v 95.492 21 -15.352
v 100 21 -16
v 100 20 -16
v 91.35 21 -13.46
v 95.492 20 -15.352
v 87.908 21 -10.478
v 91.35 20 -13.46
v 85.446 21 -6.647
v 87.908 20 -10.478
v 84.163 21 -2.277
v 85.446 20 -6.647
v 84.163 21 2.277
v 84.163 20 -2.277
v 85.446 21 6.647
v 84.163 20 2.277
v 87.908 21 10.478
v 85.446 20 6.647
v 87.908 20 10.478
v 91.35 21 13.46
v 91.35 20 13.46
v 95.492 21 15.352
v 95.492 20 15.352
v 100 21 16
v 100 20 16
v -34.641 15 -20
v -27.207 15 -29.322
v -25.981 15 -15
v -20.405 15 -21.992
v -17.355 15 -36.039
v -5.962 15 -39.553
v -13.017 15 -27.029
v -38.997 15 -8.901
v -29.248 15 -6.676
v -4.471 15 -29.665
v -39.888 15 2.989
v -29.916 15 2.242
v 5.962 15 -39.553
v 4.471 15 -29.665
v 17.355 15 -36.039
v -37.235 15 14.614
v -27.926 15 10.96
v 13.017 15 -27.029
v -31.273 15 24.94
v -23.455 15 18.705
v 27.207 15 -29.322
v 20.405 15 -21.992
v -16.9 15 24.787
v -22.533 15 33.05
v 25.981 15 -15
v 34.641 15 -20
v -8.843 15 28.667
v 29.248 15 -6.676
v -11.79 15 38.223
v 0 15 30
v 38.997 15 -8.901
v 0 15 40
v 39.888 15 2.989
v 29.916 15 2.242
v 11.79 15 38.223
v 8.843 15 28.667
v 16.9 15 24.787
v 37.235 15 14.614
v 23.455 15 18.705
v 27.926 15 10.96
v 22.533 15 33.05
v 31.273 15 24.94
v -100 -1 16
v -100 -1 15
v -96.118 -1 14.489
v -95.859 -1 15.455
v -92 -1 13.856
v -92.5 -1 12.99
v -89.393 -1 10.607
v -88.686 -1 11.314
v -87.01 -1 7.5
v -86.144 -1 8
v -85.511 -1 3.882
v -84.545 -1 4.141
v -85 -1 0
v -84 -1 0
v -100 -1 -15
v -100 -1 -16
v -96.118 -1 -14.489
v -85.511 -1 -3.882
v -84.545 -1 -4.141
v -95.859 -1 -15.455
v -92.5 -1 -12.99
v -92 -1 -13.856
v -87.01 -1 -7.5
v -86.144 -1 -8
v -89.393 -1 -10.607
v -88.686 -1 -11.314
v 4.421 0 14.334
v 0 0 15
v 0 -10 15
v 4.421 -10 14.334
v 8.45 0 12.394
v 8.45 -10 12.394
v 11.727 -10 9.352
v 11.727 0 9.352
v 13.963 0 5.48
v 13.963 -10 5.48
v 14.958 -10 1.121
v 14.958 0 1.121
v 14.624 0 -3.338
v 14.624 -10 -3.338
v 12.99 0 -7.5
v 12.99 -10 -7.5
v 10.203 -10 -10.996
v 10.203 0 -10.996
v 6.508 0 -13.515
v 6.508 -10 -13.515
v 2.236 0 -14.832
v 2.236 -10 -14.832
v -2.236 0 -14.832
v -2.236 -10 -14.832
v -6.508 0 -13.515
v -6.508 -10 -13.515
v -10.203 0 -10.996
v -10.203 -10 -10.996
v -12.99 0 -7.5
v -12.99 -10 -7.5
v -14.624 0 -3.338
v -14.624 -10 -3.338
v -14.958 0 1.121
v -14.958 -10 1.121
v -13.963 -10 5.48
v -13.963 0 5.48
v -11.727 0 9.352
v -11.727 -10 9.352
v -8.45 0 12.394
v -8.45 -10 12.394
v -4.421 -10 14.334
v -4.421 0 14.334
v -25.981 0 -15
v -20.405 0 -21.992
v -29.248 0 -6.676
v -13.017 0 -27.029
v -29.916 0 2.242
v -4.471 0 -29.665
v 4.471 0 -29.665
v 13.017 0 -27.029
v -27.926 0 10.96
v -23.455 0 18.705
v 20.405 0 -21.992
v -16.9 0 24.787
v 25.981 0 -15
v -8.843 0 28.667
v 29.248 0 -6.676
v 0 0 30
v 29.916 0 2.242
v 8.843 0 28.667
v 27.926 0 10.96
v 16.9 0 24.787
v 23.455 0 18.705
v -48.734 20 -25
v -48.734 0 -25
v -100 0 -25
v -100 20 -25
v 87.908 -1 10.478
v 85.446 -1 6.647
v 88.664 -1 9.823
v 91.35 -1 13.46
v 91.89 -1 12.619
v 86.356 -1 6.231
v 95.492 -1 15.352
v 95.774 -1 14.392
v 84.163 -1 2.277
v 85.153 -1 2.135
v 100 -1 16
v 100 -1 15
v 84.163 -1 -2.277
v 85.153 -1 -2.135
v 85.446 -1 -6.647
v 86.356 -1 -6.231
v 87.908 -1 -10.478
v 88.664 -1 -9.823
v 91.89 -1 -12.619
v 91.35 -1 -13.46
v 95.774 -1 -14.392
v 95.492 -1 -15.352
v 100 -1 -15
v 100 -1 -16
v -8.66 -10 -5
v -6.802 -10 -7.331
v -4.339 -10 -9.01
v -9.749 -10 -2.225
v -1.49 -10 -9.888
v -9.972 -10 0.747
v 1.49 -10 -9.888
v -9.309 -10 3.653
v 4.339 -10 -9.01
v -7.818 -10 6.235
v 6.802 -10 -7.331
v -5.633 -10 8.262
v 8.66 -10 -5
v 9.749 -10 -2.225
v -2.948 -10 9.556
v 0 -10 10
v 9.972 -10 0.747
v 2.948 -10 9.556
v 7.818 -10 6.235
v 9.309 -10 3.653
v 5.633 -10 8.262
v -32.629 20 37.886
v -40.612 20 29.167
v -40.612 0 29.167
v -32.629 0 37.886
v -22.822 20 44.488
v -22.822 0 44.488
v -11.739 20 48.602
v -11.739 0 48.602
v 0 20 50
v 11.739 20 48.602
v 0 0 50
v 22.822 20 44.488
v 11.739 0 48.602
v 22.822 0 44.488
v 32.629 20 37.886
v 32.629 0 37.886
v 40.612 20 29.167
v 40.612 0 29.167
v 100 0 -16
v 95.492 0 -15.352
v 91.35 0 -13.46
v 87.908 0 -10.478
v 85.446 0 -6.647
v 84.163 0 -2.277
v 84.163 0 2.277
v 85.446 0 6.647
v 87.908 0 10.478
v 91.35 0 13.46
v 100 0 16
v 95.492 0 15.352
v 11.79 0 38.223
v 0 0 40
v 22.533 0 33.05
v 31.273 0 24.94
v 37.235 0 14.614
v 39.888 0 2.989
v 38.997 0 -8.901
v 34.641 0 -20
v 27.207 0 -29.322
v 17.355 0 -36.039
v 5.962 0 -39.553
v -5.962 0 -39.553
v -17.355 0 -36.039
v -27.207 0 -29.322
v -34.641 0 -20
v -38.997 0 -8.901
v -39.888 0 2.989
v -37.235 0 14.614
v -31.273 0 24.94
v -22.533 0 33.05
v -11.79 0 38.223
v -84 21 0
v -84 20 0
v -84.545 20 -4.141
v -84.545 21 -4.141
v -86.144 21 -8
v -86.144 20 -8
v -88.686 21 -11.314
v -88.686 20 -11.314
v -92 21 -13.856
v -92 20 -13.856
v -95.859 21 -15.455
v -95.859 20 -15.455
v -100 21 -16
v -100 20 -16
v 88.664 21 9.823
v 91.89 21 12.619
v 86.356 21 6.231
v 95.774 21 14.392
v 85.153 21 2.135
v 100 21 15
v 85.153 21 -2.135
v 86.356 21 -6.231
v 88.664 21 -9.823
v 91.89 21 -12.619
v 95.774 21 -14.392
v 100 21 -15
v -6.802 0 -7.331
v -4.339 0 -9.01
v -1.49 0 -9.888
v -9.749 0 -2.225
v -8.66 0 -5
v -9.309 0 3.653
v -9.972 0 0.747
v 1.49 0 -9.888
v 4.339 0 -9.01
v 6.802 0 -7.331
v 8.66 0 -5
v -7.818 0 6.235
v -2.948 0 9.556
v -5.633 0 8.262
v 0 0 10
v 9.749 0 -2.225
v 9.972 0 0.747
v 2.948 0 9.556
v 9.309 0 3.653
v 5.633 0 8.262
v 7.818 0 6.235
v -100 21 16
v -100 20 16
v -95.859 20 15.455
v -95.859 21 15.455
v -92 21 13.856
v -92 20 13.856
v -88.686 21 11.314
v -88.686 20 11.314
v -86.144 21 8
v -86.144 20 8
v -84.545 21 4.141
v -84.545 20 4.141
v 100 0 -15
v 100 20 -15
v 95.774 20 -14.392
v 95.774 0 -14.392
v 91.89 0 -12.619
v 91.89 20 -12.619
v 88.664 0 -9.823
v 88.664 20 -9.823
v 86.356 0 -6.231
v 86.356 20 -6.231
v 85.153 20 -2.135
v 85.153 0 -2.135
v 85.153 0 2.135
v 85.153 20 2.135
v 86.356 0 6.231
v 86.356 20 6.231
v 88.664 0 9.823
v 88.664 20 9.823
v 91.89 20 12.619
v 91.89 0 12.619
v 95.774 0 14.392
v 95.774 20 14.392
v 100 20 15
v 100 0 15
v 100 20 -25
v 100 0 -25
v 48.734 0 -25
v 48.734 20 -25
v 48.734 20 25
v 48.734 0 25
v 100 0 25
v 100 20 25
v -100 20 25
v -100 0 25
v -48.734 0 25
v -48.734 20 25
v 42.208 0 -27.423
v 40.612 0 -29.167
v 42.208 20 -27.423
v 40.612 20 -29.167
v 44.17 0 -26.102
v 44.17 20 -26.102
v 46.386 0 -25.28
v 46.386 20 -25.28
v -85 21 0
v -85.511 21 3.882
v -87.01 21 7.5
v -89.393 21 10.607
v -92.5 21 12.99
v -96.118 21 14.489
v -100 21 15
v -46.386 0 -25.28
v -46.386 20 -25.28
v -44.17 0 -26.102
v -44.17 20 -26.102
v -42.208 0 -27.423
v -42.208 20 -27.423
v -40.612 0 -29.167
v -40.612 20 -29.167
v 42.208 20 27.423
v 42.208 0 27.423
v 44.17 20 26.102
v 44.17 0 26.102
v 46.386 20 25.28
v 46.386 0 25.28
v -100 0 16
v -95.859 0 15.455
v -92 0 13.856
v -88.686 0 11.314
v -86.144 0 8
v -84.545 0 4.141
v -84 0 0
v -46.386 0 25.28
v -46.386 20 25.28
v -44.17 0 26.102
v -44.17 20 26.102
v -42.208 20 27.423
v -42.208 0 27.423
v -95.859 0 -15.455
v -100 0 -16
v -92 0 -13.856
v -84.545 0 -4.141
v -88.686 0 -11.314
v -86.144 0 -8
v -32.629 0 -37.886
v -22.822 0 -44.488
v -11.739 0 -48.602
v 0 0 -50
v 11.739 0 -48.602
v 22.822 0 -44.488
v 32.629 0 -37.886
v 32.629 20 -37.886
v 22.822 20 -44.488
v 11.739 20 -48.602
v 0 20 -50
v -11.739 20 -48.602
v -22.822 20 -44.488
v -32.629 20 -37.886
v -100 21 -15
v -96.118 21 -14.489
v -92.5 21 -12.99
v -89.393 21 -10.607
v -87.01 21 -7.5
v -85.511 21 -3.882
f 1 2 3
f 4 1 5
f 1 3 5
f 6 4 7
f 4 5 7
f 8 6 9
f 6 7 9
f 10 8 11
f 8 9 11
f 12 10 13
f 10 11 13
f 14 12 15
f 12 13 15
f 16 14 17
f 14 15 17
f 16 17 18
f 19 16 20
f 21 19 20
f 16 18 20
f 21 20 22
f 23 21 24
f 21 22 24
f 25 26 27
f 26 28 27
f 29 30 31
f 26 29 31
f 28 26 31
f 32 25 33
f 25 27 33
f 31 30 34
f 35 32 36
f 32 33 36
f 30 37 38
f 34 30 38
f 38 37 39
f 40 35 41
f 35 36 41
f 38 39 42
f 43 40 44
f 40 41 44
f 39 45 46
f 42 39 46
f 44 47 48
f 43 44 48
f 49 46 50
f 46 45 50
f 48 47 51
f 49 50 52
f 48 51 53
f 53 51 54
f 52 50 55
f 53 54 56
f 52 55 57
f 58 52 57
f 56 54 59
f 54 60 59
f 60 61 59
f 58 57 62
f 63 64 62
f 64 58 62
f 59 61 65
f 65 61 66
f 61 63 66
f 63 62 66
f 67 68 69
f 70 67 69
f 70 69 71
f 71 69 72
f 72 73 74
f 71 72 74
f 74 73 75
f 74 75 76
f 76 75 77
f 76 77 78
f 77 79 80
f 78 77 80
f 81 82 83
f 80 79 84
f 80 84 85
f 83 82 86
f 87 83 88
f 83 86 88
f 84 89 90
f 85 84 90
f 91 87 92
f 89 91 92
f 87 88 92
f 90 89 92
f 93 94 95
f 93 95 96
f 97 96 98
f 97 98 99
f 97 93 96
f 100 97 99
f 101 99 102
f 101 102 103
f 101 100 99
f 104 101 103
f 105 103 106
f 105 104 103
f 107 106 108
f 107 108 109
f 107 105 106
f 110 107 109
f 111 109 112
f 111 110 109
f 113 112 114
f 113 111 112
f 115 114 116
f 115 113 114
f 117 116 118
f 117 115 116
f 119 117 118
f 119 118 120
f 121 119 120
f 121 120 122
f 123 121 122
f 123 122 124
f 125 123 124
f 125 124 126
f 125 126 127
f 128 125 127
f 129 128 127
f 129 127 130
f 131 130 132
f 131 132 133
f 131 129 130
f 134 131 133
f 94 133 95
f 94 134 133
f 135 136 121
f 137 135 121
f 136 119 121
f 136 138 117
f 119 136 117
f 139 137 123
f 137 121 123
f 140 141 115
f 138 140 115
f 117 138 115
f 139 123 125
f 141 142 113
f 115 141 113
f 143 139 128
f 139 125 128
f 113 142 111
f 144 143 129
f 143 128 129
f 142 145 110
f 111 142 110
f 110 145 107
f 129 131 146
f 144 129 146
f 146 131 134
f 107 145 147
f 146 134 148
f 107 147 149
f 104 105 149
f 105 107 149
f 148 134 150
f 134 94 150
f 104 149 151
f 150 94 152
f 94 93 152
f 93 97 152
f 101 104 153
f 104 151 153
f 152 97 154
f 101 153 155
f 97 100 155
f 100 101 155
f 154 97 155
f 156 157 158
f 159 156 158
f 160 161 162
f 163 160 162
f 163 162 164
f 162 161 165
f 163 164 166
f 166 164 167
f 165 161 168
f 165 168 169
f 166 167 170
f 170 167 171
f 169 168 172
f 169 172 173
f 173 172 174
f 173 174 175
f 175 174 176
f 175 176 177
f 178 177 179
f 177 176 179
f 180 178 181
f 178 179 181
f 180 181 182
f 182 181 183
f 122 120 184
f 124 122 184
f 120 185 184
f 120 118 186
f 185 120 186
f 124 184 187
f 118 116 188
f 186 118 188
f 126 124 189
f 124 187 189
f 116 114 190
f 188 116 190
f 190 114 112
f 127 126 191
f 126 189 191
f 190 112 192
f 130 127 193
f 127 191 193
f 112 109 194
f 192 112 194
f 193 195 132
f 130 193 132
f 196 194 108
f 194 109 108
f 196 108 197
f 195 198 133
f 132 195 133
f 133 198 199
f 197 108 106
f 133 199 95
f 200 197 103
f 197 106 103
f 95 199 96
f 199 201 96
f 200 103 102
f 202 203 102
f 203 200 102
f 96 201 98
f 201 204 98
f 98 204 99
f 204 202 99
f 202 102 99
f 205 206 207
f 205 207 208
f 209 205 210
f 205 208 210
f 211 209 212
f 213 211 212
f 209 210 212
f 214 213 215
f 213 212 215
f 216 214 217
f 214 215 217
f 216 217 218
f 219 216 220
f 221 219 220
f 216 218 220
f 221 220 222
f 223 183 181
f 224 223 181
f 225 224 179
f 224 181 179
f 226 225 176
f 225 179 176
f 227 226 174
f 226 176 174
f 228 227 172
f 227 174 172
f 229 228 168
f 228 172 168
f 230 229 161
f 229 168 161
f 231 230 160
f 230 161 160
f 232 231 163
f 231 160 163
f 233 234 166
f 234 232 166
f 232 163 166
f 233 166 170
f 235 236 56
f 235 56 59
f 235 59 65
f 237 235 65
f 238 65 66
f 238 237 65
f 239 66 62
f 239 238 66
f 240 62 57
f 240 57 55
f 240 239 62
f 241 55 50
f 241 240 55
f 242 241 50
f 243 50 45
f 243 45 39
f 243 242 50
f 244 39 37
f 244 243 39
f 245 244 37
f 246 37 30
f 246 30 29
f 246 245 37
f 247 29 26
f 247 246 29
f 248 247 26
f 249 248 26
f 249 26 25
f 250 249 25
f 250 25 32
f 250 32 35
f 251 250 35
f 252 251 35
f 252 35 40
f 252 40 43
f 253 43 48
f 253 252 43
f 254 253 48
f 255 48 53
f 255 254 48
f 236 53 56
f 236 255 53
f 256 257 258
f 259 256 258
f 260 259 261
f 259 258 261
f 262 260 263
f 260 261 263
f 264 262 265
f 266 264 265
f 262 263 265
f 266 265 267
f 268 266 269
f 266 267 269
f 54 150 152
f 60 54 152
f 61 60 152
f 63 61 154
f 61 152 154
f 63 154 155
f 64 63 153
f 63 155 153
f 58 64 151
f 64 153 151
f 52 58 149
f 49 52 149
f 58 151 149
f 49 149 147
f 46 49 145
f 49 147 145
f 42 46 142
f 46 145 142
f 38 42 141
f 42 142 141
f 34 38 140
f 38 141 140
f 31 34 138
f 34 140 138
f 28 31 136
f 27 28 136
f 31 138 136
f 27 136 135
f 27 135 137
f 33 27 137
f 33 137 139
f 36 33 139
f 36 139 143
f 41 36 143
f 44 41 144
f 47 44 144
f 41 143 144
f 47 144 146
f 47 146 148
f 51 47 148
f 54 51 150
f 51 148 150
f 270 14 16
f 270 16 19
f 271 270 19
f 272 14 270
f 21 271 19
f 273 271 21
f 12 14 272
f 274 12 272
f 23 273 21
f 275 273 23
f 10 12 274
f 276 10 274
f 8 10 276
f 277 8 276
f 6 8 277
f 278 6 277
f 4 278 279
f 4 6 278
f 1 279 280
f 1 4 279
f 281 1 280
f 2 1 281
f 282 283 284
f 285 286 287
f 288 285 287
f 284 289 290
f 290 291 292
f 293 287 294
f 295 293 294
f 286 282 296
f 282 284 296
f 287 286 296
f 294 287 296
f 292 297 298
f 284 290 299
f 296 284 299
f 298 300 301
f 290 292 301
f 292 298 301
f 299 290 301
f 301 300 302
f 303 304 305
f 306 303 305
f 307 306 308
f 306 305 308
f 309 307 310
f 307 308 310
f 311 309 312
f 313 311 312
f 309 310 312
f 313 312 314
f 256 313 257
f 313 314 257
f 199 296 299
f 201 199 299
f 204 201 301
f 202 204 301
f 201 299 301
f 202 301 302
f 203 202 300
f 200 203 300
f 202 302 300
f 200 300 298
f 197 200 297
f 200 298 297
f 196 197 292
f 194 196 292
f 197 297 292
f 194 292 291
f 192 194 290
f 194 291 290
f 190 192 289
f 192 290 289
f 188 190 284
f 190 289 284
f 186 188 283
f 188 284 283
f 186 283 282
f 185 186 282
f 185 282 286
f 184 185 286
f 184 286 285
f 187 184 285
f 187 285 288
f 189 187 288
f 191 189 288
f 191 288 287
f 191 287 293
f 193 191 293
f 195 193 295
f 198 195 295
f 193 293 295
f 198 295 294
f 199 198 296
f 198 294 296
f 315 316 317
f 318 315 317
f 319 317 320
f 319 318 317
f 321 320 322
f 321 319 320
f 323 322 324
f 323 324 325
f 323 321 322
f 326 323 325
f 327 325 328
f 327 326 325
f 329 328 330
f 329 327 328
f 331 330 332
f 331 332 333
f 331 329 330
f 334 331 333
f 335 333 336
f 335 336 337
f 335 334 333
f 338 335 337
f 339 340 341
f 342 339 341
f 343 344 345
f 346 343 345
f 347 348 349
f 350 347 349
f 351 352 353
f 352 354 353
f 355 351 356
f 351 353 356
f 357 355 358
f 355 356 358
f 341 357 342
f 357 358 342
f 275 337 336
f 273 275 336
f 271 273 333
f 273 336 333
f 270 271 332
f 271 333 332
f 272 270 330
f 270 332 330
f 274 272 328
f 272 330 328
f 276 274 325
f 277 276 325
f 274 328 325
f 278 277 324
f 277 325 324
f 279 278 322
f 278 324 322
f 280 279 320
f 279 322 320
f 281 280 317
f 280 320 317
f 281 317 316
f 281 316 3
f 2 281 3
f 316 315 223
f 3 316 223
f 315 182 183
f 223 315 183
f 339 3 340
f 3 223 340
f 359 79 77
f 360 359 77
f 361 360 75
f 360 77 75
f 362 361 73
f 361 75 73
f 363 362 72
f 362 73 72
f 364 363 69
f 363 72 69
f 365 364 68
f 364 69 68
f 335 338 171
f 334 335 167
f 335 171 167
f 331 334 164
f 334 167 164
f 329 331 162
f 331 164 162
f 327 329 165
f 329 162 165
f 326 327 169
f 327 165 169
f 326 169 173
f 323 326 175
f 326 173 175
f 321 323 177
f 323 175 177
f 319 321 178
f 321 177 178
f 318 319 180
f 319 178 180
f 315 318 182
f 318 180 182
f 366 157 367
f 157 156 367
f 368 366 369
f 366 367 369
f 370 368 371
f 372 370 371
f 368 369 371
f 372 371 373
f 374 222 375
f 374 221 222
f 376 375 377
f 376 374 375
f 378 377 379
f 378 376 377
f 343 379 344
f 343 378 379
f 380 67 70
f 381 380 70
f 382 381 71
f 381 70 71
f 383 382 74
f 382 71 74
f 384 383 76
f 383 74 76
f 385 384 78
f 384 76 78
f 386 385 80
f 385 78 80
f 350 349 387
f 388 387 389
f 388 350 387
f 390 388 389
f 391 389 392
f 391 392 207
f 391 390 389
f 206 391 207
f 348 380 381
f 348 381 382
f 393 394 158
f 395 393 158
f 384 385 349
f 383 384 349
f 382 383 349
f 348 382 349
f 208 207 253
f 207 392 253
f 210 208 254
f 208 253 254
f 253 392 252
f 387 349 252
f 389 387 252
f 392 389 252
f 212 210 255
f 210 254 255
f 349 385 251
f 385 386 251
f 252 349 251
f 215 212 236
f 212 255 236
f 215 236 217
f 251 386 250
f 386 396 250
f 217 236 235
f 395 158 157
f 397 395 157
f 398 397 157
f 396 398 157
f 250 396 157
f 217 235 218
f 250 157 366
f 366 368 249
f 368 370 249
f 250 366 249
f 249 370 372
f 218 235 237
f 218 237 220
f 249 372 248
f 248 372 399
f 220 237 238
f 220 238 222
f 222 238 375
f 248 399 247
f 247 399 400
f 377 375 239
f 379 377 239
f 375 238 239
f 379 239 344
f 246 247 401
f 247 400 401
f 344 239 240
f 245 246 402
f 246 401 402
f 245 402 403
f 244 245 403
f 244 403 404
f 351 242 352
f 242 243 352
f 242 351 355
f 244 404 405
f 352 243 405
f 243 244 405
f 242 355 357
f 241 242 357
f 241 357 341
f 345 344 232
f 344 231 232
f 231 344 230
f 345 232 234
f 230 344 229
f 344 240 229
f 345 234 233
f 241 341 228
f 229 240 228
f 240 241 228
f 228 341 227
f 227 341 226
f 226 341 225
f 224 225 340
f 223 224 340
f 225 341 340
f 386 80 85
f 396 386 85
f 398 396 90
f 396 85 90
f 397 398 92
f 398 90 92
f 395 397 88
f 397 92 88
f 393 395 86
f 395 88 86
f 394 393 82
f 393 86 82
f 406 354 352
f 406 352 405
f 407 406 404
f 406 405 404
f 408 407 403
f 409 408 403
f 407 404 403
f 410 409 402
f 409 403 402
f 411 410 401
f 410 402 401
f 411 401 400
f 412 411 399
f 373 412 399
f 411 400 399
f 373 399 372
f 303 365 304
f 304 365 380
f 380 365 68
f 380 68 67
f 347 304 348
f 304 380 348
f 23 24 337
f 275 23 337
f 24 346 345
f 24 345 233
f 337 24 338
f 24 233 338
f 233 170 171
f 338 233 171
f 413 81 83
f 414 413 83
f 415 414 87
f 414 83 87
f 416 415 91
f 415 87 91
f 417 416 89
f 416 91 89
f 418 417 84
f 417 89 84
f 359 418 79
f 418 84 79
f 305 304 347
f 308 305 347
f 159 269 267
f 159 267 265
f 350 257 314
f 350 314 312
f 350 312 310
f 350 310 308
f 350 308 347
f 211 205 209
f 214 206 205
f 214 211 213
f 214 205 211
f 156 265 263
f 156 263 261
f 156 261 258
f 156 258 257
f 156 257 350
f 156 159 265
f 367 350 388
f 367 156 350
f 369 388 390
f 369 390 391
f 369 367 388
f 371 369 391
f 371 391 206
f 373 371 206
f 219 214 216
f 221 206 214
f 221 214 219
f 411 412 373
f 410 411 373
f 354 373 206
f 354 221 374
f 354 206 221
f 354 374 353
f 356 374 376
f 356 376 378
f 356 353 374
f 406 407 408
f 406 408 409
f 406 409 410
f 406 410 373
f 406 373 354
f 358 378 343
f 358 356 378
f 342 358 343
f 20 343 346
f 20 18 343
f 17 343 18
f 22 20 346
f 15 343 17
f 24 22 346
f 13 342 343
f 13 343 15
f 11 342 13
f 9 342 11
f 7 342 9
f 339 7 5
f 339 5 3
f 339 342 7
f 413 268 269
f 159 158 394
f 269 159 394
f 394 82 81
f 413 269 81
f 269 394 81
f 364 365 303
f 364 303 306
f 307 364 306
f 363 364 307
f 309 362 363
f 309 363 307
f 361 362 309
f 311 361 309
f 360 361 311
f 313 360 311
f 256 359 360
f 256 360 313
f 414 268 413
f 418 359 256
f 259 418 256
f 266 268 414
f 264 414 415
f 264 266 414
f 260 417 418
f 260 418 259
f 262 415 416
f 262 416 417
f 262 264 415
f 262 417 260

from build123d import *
from build123d.topology import SkipClean

# Parameters (mm, degrees)
EXTRUDE_1_DEPTH      = 20
FILLET_1_R           = 10
FILLET_2_R           = 10
SKETCH_3_R           = 15
CUT_EXTRUDE_1_DEPTH  = 20
EXTRUDE_2_DEPTH      = 21
EXTRUDE_2_DEPTH_BACK = 1
SKETCH_2_R           = 40
CUT_EXTRUDE_2_DEPTH  = 15
SKETCH_5_R           = 30
EXTRUDE_3_DEPTH      = 15
SKETCH_5_3_R         = 15
SKETCH_5_3_R_2       = 10
EXTRUDE_4_DEPTH      = 10


with BuildPart() as part:
    # 草图1 → 凸台-拉伸1 (new body)
    with BuildSketch(Plane(origin=(0, 0, 0), x_dir=(1, 0, 0), z_dir=(0, 1, 0))):
        with BuildLine():
            Line((-100, 25), (-100, -25))
            Line((-100, -25), (-43.301270189, -25))
            ThreePointArc((-43.301270189, -25), (0, -50), (43.301270189, -25))
            Line((43.301270189, -25), (100, -25))
            Line((100, -25), (100, 25))
            Line((100, 25), (43.301270189, 25))
            ThreePointArc((43.301270189, 25), (0, 50), (-43.301270189, 25))
            Line((-43.301270189, 25), (-100, 25))
        make_face()
    extrude(amount=EXTRUDE_1_DEPTH)

    # 圆角1
    fillet_1_edges = [part.edges().sort_by_distance(p)[0] for p in [
        (-43.301270189, 10, 25),
    ]]
    fillet(fillet_1_edges, radius=FILLET_1_R)

    # 圆角2
    fillet_2_edges = [part.edges().sort_by_distance(p)[0] for p in [
        (43.301270189, 10, 25),
        (43.301270189, 10, -25),
        (-43.301270189, 10, -25),
    ]]
    fillet(fillet_2_edges, radius=FILLET_2_R)

    # 草图3 → 切除-拉伸1 (cut)
    with BuildSketch(Plane(origin=(0, 0, 0), x_dir=(1, 0, 0), z_dir=(0, 1, 0))):
        with Locations((-100, 0)):
            Circle(SKETCH_3_R)
        with Locations((100, 0)):
            Circle(SKETCH_3_R)
    extrude(amount=CUT_EXTRUDE_1_DEPTH, mode=Mode.SUBTRACT)

    # 草图4 → 凸台-拉伸2 (add, two sides: drawn at the far end of the back side and taken through both)
    with BuildSketch(Plane(origin=(0, 0, 0), x_dir=(1, 0, 0), z_dir=(0, 1, 0)).offset(-EXTRUDE_2_DEPTH_BACK)):
        with BuildLine():
            ThreePointArc((-100, -16), (-84, 0), (-100, 16))
            Line((-100, 16), (-100, 15))
            ThreePointArc((-100, 15), (-85, 0), (-100, -15))
            Line((-100, -15), (-100, -16))
        make_face()
        with BuildLine():
            Line((100, -16), (100, -15))
            ThreePointArc((100, -15), (85, 0), (100, 15))
            Line((100, 15), (100, 16))
            ThreePointArc((100, 16), (84, 0), (100, -16))
        make_face()
    extrude(amount=EXTRUDE_2_DEPTH + EXTRUDE_2_DEPTH_BACK)

    # 草图2 → 切除-拉伸2 (cut)
    with SkipClean():  # the faces are left unmerged after this step: merging them gives an invalid solid
        with BuildSketch(Plane(origin=(0, 0, 0), x_dir=(1, 0, 0), z_dir=(0, 1, 0))):
            Circle(SKETCH_2_R)
        extrude(amount=CUT_EXTRUDE_2_DEPTH, mode=Mode.SUBTRACT)

    # 草图5 → 凸台-拉伸3 (add)
    with SkipClean():  # the faces are left unmerged after this step: merging them gives an invalid solid
        with BuildSketch(Plane(origin=(0, 0, 0), x_dir=(1, 0, 0), z_dir=(0, 1, 0))):
            Circle(SKETCH_5_R)
        extrude(amount=EXTRUDE_3_DEPTH)

    # 草图5<3> → 凸台-拉伸4 (add)
    with SkipClean():  # the faces are left unmerged after this step: merging them gives an invalid solid
        with BuildSketch(Plane(origin=(0, 0, 0), x_dir=(1, 0, 0), z_dir=(0, 1, 0))):
            Circle(SKETCH_5_3_R)
            Circle(SKETCH_5_3_R_2, mode=Mode.SUBTRACT)
        extrude(amount=-EXTRUDE_4_DEPTH)


solid = part.part
